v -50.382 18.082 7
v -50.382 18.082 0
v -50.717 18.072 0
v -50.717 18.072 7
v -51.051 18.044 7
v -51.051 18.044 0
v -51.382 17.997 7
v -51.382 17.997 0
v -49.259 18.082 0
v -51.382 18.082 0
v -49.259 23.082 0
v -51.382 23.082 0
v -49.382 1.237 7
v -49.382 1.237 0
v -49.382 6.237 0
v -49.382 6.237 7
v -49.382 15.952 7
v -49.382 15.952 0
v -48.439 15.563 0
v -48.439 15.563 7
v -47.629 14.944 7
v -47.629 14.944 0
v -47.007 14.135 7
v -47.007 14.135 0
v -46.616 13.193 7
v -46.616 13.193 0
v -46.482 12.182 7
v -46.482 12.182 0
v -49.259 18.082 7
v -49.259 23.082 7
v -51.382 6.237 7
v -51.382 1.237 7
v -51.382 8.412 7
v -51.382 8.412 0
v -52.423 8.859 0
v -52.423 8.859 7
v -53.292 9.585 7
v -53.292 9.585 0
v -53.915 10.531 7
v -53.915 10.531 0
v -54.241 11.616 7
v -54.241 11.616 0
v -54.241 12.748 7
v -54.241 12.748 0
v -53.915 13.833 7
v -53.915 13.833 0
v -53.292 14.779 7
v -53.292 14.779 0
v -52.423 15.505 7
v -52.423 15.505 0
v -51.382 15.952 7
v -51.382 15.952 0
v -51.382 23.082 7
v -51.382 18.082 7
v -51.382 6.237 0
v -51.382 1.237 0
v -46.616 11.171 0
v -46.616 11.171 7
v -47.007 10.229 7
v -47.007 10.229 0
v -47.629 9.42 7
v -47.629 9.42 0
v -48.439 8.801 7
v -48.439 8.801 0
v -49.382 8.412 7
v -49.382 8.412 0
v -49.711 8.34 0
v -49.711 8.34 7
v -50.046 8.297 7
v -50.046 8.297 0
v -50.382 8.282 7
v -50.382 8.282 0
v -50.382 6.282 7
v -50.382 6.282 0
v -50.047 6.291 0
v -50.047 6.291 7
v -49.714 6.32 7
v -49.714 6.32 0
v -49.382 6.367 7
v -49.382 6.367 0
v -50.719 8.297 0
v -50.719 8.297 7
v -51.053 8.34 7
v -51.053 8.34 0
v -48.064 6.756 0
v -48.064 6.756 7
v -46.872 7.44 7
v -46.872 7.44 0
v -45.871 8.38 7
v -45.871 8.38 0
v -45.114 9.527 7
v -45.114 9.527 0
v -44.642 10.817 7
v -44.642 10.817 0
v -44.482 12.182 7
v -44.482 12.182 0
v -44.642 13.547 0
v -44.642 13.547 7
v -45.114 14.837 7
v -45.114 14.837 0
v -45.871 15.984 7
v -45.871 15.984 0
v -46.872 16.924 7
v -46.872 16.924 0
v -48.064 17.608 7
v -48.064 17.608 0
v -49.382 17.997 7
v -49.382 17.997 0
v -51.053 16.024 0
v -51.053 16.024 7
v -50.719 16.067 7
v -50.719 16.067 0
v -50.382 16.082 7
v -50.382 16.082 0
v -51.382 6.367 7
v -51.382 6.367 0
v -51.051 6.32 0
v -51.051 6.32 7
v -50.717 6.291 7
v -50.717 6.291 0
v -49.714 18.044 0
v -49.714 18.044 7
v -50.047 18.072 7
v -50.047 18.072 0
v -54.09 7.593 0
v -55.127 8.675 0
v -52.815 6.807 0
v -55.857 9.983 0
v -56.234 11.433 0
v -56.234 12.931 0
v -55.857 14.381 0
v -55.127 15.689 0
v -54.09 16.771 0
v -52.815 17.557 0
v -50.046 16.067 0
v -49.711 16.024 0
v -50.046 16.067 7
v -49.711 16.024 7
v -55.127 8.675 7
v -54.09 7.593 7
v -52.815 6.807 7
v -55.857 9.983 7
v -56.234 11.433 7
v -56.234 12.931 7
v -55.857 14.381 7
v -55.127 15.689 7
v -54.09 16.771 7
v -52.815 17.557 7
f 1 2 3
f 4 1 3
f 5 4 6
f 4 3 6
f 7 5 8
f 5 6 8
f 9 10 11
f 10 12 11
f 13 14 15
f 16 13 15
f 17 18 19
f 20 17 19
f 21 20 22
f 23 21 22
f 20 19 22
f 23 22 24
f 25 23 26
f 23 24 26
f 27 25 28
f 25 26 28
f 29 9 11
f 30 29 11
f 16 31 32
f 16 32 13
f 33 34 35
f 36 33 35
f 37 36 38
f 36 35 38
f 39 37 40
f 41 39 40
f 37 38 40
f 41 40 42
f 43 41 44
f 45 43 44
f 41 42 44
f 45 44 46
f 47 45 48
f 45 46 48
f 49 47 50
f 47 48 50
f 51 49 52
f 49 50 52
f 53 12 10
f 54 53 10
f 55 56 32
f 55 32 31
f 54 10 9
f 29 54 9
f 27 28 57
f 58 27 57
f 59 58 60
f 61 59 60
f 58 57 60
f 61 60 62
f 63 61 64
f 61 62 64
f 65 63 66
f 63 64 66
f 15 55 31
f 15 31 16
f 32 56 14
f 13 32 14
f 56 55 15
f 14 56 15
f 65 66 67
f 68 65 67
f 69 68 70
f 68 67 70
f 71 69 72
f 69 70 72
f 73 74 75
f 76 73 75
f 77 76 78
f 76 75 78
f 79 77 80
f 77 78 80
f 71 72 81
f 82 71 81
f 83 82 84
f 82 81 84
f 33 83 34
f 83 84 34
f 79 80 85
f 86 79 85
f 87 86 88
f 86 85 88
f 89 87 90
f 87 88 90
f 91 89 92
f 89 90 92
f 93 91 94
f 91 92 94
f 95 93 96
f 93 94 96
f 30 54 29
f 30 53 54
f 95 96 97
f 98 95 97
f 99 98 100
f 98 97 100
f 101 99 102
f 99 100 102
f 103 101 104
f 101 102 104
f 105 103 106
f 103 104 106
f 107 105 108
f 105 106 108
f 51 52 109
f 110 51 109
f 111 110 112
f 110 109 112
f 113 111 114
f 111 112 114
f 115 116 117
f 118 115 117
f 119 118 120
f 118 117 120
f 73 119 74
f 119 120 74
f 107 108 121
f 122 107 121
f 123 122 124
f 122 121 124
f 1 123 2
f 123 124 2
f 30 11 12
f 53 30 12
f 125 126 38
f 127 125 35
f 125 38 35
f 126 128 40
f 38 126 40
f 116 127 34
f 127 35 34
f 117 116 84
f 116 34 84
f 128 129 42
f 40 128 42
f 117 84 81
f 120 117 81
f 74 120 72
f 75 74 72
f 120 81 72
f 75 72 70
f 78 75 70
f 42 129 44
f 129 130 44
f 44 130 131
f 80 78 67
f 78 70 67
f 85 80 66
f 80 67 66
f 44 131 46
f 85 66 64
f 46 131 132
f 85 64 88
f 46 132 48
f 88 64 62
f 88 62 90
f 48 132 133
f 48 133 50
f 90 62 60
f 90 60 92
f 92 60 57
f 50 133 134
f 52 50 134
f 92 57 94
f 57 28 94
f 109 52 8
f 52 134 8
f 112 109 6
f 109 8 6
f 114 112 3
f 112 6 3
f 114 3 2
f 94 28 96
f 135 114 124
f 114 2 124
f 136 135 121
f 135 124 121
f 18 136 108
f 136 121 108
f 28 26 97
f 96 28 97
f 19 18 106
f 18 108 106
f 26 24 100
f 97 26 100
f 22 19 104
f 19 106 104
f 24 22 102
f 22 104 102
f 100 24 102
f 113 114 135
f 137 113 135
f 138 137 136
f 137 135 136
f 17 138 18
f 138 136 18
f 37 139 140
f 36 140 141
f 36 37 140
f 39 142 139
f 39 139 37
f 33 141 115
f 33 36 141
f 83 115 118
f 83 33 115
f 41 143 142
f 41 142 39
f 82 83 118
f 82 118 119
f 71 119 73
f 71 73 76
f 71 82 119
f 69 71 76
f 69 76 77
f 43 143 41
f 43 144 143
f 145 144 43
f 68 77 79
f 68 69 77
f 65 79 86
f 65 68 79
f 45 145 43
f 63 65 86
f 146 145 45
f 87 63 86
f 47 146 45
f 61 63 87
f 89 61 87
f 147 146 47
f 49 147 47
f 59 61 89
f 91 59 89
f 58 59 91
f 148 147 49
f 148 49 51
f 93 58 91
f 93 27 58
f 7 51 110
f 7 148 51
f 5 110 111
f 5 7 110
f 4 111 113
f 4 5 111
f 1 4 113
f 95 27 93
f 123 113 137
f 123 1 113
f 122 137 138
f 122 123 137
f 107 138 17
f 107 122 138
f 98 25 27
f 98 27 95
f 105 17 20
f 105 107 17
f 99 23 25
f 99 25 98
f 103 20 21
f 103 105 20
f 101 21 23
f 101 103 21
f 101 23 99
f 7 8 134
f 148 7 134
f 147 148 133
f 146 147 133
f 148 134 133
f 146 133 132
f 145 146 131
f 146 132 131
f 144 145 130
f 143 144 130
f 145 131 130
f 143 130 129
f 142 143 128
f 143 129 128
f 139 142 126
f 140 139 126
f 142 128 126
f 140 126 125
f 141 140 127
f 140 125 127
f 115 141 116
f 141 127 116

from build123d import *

# Parameters (mm, degrees)
F1_DEPTH = 7
F0_W     = 2
F0_H     = 5


with BuildPart() as f1:
    # F0 (on Top) → F1 (new body)
    with BuildSketch(Plane.XY):
        with BuildLine():
            ThreePointArc((-51.3822378814, 8.4123586511), (-54.2822378814, 12.1819740161), (-51.3822378814, 15.9515893811))
            Line((-51.3822378814, 15.9515893811), (-51.3822378814, 17.9966107202))
            ThreePointArc((-51.3822378814, 17.9966107202), (-56.2822378814, 12.1819740161), (-51.3822378814, 6.3673373121))
            Line((-51.3822378814, 6.3673373121), (-51.3822378814, 8.4123586511))
        make_face()
        with BuildLine():
            ThreePointArc((-49.3822378814, 15.9515893811), (-47.2911215782, 14.5599984062), (-46.4822378814, 12.1819740161))
            ThreePointArc((-46.4822378814, 12.1819740161), (-47.2911215782, 9.803949626), (-49.3822378814, 8.4123586511))
            Line((-49.3822378814, 8.4123586511), (-49.3822378814, 6.3673373121))
            ThreePointArc((-49.3822378814, 6.3673373121), (-45.8705862991, 8.3800008442), (-44.4822378814, 12.1819740161))
            ThreePointArc((-44.4822378814, 12.1819740161), (-45.8705862991, 15.9839471881), (-49.3822378814, 17.9966107202))
            Line((-49.3822378814, 17.9966107202), (-49.3822378814, 15.9515893811))
        make_face()
        with BuildLine():
            ThreePointArc((-50.3822378814, 16.0819740161), (-49.8780057541, 16.0492404876), (-49.3822378814, 15.9515893811))
            Line((-49.3822378814, 15.9515893811), (-49.3822378814, 17.9966107202))
            ThreePointArc((-49.3822378814, 17.9966107202), (-49.880419465, 18.0605944561), (-50.3822378814, 18.0819740161))
            Line((-50.3822378814, 18.0819740161), (-50.3822378814, 16.0819740161))
        make_face()
        with BuildLine():
            ThreePointArc((-51.3822378814, 15.9515893811), (-50.8864700088, 16.0492404876), (-50.3822378814, 16.0819740161))
            Line((-50.3822378814, 16.0819740161), (-50.3822378814, 18.0819740161))
            ThreePointArc((-50.3822378814, 18.0819740161), (-50.8840562979, 18.0605944561), (-51.3822378814, 17.9966107202))
            Line((-51.3822378814, 17.9966107202), (-51.3822378814, 15.9515893811))
        make_face()
        with BuildLine():
            Line((-50.3822378814, 6.2819740161), (-50.3822378814, 8.2819740161))
            ThreePointArc((-50.3822378814, 8.2819740161), (-50.8864700088, 8.3147075446), (-51.3822378814, 8.4123586511))
            Line((-51.3822378814, 8.4123586511), (-51.3822378814, 6.3673373121))
            ThreePointArc((-51.3822378814, 6.3673373121), (-50.8840562979, 6.3033535762), (-50.3822378814, 6.2819740161))
        make_face()
        with BuildLine():
            Line((-49.3822378814, 6.3673373121), (-49.3822378814, 8.4123586511))
            ThreePointArc((-49.3822378814, 8.4123586511), (-49.8780057541, 8.3147075446), (-50.3822378814, 8.2819740161))
            Line((-50.3822378814, 8.2819740161), (-50.3822378814, 6.2819740161))
            ThreePointArc((-50.3822378814, 6.2819740161), (-49.880419465, 6.3033535762), (-49.3822378814, 6.3673373121))
        make_face()
    extrude(amount=F1_DEPTH)


with BuildPart() as f1b:
    # F0 (on Top) → F1, piece 2 (new body)
    with BuildSketch(Plane.XY):
        Polygon((-51.3822378814, 18.0819740161), (-50.3822378814, 18.0819740161), (-49.3822378814, 18.0819740161), (-49.2586456239, 18.0819740161), (-49.2586456239, 23.0819740161), (-51.3822378814, 23.0819740161), align=None)
    extrude(amount=F1_DEPTH)


with BuildPart() as f1c:
    # F0 (on Top) → F1, piece 3 (new body)
    with BuildSketch(Plane.XY):
        with Locations((-50.3822378814, 3.7373728678)):
            Rectangle(F0_W, F0_H)
    extrude(amount=F1_DEPTH)


solid = Compound([f1.part, f1b.part, f1c.part])
